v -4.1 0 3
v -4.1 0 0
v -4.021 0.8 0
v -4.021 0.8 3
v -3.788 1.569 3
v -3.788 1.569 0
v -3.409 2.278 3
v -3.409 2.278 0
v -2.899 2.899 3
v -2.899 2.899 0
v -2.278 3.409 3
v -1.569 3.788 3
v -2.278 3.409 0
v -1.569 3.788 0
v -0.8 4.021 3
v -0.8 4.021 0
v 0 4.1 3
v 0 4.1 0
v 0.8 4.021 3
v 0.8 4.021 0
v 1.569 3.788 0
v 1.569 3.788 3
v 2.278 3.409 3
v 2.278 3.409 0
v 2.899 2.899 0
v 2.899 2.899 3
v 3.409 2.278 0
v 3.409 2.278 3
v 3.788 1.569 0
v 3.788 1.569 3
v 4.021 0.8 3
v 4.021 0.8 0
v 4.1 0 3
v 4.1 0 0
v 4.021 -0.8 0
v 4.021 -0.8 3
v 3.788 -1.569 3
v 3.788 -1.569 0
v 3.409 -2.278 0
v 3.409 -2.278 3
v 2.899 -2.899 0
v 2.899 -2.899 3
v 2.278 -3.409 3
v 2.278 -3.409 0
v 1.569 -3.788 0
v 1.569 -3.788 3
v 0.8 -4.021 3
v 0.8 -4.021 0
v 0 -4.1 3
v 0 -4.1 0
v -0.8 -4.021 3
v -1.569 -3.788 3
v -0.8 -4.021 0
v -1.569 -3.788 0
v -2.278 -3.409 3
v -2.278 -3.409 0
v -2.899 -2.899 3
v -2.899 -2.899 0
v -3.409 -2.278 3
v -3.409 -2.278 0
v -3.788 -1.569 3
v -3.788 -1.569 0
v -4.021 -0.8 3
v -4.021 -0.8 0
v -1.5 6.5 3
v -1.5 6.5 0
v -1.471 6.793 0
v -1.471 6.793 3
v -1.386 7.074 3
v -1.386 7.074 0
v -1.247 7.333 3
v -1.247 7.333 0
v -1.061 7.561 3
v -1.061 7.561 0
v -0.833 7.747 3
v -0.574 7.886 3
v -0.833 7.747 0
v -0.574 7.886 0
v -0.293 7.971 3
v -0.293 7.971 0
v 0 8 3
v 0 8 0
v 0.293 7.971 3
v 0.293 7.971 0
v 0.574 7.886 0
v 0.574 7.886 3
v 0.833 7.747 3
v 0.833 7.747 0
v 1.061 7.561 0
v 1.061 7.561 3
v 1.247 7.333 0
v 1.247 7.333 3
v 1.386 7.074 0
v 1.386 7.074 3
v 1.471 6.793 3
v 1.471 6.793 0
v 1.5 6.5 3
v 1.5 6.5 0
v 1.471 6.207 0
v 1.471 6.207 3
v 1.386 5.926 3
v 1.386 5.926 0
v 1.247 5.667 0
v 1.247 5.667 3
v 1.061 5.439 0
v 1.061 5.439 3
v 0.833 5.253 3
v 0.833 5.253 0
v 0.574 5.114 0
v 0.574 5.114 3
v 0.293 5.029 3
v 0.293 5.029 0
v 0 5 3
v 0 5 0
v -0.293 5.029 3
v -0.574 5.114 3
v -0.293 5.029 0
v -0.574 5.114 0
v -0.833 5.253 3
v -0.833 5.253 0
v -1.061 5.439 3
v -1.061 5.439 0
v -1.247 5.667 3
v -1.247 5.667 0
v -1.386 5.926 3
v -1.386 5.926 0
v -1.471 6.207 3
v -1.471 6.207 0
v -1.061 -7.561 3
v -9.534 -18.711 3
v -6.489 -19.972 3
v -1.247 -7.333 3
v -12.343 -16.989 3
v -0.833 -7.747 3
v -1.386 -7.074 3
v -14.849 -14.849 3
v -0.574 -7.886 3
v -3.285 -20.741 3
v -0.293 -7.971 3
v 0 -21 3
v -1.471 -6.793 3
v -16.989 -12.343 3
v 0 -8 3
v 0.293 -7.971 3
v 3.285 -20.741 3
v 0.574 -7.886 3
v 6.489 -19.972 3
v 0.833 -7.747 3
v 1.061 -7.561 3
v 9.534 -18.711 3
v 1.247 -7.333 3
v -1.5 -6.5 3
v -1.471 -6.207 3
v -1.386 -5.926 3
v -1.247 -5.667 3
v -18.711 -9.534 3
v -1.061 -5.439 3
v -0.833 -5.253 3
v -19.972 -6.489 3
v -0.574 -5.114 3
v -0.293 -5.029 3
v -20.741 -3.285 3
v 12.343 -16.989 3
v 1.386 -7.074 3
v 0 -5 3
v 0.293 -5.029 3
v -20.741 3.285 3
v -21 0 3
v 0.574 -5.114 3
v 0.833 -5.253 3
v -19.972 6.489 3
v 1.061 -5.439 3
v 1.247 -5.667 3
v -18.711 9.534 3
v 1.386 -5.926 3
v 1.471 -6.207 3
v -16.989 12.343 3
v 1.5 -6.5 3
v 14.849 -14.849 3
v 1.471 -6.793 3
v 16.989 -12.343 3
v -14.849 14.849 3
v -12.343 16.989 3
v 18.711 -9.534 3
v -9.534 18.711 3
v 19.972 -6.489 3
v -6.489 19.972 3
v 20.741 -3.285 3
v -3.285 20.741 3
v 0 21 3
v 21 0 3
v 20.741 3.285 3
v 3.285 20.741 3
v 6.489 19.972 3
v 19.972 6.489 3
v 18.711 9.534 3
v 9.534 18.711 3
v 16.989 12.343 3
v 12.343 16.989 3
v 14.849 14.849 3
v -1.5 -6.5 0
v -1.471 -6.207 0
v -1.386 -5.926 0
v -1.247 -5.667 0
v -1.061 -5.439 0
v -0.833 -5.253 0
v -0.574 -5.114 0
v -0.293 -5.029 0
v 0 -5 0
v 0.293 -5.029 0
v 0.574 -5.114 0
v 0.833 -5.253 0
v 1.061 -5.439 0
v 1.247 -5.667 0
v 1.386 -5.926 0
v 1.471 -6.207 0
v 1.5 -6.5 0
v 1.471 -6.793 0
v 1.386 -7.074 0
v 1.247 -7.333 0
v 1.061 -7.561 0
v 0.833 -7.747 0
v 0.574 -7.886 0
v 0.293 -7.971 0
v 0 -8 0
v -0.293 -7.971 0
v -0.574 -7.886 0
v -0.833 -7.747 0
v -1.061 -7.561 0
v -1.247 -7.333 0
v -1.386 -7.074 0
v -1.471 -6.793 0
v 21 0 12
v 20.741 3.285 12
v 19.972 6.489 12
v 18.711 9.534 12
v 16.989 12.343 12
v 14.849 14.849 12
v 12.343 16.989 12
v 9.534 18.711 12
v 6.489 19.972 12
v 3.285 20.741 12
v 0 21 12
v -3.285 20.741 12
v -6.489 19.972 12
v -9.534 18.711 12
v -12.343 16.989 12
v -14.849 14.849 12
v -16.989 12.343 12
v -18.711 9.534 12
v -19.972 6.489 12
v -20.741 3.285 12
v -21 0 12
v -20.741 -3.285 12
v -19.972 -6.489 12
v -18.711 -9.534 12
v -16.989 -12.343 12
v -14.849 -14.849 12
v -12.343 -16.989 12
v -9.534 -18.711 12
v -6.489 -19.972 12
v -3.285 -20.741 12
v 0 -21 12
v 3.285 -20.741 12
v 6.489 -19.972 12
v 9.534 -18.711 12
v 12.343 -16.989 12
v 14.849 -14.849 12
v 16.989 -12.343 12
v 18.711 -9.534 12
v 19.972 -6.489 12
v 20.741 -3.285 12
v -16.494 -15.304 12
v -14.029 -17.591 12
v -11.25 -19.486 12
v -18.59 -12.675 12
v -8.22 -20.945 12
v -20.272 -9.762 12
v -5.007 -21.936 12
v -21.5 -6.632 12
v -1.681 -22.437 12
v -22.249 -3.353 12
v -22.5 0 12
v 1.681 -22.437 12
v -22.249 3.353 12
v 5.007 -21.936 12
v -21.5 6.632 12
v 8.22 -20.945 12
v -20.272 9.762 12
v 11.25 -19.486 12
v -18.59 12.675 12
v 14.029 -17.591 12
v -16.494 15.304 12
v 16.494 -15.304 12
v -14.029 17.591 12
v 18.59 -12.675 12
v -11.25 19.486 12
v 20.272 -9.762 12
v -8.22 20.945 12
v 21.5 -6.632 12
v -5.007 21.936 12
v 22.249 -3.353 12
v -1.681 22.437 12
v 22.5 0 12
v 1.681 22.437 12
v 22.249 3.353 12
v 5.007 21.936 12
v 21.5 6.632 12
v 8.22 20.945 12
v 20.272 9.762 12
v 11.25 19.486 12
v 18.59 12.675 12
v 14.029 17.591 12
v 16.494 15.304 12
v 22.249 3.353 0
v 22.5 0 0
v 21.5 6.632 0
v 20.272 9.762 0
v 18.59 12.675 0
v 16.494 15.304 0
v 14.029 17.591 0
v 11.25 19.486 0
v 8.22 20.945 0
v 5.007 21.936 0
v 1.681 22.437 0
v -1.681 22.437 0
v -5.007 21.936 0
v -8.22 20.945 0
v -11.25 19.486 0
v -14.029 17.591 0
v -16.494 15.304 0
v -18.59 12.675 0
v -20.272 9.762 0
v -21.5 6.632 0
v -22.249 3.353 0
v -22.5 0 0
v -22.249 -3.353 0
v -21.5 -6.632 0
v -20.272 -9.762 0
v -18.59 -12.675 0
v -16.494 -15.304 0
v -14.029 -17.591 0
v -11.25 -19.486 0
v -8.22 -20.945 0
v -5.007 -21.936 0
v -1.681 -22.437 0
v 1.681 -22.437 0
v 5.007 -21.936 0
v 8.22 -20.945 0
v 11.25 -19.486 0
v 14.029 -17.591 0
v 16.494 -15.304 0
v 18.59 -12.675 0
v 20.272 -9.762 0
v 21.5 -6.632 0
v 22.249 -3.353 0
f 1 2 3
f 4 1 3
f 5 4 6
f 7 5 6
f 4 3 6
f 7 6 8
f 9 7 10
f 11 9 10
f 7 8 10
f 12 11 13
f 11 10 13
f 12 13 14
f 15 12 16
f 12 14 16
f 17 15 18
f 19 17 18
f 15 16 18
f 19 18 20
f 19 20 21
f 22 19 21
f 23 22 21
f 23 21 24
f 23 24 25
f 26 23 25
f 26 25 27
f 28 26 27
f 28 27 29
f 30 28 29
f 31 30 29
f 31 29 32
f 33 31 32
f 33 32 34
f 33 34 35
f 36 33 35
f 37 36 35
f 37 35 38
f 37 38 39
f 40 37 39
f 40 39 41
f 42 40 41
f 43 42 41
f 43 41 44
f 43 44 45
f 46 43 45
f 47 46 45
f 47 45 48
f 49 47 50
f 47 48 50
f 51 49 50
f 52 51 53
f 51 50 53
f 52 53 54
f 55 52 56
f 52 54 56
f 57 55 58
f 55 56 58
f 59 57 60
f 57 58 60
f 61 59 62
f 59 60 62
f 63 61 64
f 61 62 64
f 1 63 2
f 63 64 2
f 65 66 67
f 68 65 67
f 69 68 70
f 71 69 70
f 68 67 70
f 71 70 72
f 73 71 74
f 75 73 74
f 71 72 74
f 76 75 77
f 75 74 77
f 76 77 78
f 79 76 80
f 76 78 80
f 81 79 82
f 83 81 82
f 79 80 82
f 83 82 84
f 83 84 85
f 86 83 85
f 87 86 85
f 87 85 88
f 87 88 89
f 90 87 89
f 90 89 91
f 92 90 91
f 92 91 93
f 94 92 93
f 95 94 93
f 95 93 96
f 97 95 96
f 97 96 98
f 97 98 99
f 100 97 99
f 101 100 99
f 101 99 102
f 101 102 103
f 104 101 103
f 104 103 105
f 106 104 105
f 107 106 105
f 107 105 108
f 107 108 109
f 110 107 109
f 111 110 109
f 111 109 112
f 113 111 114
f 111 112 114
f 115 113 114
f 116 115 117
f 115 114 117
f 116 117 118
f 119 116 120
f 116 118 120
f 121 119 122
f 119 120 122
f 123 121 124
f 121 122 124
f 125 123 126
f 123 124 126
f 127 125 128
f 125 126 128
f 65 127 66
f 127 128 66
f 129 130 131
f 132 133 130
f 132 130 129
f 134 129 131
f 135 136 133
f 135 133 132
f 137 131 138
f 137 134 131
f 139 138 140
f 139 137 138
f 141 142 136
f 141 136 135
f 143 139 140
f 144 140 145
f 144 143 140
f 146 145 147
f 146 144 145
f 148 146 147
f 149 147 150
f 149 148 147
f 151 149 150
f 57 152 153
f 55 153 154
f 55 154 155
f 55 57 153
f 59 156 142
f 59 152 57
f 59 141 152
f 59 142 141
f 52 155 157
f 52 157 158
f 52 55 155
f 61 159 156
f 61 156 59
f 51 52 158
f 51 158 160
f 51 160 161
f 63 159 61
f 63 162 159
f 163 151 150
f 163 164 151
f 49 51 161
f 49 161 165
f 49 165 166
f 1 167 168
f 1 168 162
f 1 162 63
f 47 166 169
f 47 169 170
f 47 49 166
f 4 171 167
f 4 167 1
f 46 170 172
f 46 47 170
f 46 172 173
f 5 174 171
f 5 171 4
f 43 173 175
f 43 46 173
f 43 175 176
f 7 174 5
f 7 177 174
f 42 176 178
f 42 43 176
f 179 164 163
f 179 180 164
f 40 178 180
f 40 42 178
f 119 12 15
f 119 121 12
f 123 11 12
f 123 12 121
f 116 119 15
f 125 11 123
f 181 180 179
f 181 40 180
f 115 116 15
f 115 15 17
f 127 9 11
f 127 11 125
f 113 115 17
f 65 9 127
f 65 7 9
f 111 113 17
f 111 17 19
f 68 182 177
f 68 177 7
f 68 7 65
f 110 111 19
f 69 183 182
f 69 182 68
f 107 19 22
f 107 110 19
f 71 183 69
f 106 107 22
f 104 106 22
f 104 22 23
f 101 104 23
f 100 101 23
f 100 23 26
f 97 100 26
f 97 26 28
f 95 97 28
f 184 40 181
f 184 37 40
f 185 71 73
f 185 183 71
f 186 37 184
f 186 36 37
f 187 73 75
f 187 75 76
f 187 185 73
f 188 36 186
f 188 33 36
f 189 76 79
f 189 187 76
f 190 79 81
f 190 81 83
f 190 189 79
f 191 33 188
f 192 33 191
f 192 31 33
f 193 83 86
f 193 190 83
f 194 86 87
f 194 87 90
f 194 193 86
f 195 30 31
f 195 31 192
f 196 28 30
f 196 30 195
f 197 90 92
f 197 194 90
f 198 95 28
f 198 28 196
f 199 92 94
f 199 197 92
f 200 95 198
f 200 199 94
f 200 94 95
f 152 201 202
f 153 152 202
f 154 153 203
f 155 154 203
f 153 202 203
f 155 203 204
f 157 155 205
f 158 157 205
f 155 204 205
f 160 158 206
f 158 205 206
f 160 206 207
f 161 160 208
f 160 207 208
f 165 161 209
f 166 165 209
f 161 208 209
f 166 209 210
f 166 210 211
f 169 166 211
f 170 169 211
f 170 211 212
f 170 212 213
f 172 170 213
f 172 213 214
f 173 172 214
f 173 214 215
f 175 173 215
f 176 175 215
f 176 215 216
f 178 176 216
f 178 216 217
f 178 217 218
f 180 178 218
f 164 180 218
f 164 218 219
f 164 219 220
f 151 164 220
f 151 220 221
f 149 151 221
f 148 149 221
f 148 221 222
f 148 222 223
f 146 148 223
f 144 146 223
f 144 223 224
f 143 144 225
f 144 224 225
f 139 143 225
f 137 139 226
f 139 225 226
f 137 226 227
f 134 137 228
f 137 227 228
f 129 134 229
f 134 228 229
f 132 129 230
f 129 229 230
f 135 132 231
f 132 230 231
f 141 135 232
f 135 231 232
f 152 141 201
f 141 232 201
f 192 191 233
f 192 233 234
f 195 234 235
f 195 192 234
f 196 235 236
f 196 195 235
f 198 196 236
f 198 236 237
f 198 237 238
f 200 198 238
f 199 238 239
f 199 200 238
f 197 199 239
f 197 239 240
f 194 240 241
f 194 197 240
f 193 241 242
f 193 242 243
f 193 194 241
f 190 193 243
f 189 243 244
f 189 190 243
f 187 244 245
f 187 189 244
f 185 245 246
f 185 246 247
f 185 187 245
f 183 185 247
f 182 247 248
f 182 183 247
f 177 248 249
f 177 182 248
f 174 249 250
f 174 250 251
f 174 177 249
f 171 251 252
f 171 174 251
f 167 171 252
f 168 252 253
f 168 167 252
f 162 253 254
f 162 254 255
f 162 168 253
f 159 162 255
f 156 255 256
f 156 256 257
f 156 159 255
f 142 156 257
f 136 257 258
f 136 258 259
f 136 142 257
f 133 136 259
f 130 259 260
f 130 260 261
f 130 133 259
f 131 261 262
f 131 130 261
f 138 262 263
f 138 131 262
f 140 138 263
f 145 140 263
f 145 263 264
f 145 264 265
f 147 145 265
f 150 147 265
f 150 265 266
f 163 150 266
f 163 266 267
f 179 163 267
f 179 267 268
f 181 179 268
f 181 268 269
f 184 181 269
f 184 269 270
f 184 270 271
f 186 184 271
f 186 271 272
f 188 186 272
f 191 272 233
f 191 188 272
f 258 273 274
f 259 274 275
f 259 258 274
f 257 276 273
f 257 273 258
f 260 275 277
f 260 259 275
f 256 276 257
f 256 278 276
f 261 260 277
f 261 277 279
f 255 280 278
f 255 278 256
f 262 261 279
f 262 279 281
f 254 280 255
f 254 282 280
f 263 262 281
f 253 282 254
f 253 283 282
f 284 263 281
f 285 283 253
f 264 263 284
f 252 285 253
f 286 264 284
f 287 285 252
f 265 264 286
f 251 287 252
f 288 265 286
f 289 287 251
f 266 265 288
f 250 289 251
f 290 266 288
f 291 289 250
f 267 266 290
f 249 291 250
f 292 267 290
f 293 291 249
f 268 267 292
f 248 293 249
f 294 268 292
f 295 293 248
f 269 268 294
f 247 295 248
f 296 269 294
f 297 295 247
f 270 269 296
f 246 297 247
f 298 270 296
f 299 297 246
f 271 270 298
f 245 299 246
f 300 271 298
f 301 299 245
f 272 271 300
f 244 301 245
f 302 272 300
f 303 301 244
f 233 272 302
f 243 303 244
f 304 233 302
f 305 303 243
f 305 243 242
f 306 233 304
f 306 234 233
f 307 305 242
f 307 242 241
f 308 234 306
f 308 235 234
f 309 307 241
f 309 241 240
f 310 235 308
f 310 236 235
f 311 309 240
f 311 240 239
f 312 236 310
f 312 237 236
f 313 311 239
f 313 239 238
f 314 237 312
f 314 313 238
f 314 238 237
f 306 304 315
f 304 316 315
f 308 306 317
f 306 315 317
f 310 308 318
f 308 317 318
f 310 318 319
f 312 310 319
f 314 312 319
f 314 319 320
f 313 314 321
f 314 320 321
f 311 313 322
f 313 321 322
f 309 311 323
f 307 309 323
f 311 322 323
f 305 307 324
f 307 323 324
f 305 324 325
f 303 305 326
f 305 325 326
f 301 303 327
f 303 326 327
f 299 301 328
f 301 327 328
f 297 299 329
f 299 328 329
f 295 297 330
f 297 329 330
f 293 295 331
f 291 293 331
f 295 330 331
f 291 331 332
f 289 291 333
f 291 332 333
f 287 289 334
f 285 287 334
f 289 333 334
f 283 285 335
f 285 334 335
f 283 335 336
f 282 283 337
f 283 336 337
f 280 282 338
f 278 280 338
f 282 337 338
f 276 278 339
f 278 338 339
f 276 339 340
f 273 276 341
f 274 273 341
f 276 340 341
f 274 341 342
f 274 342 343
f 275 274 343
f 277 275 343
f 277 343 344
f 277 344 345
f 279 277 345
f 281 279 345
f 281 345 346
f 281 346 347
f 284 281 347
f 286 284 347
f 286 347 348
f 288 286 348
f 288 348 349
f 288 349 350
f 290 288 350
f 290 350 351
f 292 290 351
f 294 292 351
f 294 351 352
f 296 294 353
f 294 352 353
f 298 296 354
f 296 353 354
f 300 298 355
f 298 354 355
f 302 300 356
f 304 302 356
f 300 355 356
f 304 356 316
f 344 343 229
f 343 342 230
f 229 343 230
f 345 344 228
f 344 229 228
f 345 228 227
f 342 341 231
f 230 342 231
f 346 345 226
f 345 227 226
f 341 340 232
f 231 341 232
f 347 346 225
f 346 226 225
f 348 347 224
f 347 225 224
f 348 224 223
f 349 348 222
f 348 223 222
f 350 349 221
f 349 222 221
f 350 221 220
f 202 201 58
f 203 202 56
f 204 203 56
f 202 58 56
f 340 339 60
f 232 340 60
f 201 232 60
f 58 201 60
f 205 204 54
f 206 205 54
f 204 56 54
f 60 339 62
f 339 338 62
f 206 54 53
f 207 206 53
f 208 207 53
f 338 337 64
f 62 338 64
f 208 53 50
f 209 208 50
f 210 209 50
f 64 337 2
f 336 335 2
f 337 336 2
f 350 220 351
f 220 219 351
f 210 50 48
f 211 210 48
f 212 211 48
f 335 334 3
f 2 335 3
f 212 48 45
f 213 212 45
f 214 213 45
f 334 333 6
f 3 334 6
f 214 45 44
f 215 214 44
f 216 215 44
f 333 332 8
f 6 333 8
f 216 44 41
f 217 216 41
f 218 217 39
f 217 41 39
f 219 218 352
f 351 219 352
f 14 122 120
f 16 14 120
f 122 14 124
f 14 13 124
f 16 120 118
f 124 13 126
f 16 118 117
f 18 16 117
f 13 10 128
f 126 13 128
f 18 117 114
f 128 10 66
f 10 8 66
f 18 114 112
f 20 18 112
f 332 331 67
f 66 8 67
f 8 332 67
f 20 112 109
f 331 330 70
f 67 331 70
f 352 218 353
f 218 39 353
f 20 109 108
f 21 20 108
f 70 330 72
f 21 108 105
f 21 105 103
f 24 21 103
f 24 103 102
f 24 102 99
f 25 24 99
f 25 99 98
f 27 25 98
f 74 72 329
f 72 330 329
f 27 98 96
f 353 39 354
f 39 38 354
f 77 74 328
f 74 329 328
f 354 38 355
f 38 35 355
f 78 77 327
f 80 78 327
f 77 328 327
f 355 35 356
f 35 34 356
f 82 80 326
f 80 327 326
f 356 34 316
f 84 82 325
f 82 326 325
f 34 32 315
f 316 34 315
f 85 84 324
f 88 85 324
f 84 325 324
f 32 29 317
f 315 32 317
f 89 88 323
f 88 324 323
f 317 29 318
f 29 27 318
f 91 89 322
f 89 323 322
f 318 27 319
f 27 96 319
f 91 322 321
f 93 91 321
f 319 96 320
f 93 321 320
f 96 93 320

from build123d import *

# Parameters (mm, degrees)
SKETCH_1_R          = 22.5
EXTRUDE_1_DEPTH     = 3
SKETCH_2_R          = 22.5
SKETCH_2_R_2        = 21
EXTRUDE_2_DEPTH     = 9
SKETCH_4_R          = 4.1
SKETCH_4_R_2        = 1.5
CUT_EXTRUDE_1_DEPTH = 35.007352146


with BuildPart() as part:
    # 草图1 → 凸台-拉伸1 (new body)
    with BuildSketch(Plane.XY):
        Circle(SKETCH_1_R)
    extrude(amount=EXTRUDE_1_DEPTH)

    # 草图2 → 凸台-拉伸2 (add)
    with BuildSketch(Plane.XY.offset(3)):
        Circle(SKETCH_2_R)
        Circle(SKETCH_2_R_2, mode=Mode.SUBTRACT)
    extrude(amount=EXTRUDE_2_DEPTH)

    # 草图4 → 切除-拉伸1 (cut, through all)
    with BuildSketch(Plane(origin=(0, 0, 0), x_dir=(-1, 0, 0), z_dir=(0, 0, -1))):
        Circle(SKETCH_4_R)
        with Locations((0, 6.5)):
            Circle(SKETCH_4_R_2)
        with Locations((0, -6.5)):
            Circle(SKETCH_4_R_2)
    extrude(amount=-CUT_EXTRUDE_1_DEPTH, mode=Mode.SUBTRACT)


solid = part.part
